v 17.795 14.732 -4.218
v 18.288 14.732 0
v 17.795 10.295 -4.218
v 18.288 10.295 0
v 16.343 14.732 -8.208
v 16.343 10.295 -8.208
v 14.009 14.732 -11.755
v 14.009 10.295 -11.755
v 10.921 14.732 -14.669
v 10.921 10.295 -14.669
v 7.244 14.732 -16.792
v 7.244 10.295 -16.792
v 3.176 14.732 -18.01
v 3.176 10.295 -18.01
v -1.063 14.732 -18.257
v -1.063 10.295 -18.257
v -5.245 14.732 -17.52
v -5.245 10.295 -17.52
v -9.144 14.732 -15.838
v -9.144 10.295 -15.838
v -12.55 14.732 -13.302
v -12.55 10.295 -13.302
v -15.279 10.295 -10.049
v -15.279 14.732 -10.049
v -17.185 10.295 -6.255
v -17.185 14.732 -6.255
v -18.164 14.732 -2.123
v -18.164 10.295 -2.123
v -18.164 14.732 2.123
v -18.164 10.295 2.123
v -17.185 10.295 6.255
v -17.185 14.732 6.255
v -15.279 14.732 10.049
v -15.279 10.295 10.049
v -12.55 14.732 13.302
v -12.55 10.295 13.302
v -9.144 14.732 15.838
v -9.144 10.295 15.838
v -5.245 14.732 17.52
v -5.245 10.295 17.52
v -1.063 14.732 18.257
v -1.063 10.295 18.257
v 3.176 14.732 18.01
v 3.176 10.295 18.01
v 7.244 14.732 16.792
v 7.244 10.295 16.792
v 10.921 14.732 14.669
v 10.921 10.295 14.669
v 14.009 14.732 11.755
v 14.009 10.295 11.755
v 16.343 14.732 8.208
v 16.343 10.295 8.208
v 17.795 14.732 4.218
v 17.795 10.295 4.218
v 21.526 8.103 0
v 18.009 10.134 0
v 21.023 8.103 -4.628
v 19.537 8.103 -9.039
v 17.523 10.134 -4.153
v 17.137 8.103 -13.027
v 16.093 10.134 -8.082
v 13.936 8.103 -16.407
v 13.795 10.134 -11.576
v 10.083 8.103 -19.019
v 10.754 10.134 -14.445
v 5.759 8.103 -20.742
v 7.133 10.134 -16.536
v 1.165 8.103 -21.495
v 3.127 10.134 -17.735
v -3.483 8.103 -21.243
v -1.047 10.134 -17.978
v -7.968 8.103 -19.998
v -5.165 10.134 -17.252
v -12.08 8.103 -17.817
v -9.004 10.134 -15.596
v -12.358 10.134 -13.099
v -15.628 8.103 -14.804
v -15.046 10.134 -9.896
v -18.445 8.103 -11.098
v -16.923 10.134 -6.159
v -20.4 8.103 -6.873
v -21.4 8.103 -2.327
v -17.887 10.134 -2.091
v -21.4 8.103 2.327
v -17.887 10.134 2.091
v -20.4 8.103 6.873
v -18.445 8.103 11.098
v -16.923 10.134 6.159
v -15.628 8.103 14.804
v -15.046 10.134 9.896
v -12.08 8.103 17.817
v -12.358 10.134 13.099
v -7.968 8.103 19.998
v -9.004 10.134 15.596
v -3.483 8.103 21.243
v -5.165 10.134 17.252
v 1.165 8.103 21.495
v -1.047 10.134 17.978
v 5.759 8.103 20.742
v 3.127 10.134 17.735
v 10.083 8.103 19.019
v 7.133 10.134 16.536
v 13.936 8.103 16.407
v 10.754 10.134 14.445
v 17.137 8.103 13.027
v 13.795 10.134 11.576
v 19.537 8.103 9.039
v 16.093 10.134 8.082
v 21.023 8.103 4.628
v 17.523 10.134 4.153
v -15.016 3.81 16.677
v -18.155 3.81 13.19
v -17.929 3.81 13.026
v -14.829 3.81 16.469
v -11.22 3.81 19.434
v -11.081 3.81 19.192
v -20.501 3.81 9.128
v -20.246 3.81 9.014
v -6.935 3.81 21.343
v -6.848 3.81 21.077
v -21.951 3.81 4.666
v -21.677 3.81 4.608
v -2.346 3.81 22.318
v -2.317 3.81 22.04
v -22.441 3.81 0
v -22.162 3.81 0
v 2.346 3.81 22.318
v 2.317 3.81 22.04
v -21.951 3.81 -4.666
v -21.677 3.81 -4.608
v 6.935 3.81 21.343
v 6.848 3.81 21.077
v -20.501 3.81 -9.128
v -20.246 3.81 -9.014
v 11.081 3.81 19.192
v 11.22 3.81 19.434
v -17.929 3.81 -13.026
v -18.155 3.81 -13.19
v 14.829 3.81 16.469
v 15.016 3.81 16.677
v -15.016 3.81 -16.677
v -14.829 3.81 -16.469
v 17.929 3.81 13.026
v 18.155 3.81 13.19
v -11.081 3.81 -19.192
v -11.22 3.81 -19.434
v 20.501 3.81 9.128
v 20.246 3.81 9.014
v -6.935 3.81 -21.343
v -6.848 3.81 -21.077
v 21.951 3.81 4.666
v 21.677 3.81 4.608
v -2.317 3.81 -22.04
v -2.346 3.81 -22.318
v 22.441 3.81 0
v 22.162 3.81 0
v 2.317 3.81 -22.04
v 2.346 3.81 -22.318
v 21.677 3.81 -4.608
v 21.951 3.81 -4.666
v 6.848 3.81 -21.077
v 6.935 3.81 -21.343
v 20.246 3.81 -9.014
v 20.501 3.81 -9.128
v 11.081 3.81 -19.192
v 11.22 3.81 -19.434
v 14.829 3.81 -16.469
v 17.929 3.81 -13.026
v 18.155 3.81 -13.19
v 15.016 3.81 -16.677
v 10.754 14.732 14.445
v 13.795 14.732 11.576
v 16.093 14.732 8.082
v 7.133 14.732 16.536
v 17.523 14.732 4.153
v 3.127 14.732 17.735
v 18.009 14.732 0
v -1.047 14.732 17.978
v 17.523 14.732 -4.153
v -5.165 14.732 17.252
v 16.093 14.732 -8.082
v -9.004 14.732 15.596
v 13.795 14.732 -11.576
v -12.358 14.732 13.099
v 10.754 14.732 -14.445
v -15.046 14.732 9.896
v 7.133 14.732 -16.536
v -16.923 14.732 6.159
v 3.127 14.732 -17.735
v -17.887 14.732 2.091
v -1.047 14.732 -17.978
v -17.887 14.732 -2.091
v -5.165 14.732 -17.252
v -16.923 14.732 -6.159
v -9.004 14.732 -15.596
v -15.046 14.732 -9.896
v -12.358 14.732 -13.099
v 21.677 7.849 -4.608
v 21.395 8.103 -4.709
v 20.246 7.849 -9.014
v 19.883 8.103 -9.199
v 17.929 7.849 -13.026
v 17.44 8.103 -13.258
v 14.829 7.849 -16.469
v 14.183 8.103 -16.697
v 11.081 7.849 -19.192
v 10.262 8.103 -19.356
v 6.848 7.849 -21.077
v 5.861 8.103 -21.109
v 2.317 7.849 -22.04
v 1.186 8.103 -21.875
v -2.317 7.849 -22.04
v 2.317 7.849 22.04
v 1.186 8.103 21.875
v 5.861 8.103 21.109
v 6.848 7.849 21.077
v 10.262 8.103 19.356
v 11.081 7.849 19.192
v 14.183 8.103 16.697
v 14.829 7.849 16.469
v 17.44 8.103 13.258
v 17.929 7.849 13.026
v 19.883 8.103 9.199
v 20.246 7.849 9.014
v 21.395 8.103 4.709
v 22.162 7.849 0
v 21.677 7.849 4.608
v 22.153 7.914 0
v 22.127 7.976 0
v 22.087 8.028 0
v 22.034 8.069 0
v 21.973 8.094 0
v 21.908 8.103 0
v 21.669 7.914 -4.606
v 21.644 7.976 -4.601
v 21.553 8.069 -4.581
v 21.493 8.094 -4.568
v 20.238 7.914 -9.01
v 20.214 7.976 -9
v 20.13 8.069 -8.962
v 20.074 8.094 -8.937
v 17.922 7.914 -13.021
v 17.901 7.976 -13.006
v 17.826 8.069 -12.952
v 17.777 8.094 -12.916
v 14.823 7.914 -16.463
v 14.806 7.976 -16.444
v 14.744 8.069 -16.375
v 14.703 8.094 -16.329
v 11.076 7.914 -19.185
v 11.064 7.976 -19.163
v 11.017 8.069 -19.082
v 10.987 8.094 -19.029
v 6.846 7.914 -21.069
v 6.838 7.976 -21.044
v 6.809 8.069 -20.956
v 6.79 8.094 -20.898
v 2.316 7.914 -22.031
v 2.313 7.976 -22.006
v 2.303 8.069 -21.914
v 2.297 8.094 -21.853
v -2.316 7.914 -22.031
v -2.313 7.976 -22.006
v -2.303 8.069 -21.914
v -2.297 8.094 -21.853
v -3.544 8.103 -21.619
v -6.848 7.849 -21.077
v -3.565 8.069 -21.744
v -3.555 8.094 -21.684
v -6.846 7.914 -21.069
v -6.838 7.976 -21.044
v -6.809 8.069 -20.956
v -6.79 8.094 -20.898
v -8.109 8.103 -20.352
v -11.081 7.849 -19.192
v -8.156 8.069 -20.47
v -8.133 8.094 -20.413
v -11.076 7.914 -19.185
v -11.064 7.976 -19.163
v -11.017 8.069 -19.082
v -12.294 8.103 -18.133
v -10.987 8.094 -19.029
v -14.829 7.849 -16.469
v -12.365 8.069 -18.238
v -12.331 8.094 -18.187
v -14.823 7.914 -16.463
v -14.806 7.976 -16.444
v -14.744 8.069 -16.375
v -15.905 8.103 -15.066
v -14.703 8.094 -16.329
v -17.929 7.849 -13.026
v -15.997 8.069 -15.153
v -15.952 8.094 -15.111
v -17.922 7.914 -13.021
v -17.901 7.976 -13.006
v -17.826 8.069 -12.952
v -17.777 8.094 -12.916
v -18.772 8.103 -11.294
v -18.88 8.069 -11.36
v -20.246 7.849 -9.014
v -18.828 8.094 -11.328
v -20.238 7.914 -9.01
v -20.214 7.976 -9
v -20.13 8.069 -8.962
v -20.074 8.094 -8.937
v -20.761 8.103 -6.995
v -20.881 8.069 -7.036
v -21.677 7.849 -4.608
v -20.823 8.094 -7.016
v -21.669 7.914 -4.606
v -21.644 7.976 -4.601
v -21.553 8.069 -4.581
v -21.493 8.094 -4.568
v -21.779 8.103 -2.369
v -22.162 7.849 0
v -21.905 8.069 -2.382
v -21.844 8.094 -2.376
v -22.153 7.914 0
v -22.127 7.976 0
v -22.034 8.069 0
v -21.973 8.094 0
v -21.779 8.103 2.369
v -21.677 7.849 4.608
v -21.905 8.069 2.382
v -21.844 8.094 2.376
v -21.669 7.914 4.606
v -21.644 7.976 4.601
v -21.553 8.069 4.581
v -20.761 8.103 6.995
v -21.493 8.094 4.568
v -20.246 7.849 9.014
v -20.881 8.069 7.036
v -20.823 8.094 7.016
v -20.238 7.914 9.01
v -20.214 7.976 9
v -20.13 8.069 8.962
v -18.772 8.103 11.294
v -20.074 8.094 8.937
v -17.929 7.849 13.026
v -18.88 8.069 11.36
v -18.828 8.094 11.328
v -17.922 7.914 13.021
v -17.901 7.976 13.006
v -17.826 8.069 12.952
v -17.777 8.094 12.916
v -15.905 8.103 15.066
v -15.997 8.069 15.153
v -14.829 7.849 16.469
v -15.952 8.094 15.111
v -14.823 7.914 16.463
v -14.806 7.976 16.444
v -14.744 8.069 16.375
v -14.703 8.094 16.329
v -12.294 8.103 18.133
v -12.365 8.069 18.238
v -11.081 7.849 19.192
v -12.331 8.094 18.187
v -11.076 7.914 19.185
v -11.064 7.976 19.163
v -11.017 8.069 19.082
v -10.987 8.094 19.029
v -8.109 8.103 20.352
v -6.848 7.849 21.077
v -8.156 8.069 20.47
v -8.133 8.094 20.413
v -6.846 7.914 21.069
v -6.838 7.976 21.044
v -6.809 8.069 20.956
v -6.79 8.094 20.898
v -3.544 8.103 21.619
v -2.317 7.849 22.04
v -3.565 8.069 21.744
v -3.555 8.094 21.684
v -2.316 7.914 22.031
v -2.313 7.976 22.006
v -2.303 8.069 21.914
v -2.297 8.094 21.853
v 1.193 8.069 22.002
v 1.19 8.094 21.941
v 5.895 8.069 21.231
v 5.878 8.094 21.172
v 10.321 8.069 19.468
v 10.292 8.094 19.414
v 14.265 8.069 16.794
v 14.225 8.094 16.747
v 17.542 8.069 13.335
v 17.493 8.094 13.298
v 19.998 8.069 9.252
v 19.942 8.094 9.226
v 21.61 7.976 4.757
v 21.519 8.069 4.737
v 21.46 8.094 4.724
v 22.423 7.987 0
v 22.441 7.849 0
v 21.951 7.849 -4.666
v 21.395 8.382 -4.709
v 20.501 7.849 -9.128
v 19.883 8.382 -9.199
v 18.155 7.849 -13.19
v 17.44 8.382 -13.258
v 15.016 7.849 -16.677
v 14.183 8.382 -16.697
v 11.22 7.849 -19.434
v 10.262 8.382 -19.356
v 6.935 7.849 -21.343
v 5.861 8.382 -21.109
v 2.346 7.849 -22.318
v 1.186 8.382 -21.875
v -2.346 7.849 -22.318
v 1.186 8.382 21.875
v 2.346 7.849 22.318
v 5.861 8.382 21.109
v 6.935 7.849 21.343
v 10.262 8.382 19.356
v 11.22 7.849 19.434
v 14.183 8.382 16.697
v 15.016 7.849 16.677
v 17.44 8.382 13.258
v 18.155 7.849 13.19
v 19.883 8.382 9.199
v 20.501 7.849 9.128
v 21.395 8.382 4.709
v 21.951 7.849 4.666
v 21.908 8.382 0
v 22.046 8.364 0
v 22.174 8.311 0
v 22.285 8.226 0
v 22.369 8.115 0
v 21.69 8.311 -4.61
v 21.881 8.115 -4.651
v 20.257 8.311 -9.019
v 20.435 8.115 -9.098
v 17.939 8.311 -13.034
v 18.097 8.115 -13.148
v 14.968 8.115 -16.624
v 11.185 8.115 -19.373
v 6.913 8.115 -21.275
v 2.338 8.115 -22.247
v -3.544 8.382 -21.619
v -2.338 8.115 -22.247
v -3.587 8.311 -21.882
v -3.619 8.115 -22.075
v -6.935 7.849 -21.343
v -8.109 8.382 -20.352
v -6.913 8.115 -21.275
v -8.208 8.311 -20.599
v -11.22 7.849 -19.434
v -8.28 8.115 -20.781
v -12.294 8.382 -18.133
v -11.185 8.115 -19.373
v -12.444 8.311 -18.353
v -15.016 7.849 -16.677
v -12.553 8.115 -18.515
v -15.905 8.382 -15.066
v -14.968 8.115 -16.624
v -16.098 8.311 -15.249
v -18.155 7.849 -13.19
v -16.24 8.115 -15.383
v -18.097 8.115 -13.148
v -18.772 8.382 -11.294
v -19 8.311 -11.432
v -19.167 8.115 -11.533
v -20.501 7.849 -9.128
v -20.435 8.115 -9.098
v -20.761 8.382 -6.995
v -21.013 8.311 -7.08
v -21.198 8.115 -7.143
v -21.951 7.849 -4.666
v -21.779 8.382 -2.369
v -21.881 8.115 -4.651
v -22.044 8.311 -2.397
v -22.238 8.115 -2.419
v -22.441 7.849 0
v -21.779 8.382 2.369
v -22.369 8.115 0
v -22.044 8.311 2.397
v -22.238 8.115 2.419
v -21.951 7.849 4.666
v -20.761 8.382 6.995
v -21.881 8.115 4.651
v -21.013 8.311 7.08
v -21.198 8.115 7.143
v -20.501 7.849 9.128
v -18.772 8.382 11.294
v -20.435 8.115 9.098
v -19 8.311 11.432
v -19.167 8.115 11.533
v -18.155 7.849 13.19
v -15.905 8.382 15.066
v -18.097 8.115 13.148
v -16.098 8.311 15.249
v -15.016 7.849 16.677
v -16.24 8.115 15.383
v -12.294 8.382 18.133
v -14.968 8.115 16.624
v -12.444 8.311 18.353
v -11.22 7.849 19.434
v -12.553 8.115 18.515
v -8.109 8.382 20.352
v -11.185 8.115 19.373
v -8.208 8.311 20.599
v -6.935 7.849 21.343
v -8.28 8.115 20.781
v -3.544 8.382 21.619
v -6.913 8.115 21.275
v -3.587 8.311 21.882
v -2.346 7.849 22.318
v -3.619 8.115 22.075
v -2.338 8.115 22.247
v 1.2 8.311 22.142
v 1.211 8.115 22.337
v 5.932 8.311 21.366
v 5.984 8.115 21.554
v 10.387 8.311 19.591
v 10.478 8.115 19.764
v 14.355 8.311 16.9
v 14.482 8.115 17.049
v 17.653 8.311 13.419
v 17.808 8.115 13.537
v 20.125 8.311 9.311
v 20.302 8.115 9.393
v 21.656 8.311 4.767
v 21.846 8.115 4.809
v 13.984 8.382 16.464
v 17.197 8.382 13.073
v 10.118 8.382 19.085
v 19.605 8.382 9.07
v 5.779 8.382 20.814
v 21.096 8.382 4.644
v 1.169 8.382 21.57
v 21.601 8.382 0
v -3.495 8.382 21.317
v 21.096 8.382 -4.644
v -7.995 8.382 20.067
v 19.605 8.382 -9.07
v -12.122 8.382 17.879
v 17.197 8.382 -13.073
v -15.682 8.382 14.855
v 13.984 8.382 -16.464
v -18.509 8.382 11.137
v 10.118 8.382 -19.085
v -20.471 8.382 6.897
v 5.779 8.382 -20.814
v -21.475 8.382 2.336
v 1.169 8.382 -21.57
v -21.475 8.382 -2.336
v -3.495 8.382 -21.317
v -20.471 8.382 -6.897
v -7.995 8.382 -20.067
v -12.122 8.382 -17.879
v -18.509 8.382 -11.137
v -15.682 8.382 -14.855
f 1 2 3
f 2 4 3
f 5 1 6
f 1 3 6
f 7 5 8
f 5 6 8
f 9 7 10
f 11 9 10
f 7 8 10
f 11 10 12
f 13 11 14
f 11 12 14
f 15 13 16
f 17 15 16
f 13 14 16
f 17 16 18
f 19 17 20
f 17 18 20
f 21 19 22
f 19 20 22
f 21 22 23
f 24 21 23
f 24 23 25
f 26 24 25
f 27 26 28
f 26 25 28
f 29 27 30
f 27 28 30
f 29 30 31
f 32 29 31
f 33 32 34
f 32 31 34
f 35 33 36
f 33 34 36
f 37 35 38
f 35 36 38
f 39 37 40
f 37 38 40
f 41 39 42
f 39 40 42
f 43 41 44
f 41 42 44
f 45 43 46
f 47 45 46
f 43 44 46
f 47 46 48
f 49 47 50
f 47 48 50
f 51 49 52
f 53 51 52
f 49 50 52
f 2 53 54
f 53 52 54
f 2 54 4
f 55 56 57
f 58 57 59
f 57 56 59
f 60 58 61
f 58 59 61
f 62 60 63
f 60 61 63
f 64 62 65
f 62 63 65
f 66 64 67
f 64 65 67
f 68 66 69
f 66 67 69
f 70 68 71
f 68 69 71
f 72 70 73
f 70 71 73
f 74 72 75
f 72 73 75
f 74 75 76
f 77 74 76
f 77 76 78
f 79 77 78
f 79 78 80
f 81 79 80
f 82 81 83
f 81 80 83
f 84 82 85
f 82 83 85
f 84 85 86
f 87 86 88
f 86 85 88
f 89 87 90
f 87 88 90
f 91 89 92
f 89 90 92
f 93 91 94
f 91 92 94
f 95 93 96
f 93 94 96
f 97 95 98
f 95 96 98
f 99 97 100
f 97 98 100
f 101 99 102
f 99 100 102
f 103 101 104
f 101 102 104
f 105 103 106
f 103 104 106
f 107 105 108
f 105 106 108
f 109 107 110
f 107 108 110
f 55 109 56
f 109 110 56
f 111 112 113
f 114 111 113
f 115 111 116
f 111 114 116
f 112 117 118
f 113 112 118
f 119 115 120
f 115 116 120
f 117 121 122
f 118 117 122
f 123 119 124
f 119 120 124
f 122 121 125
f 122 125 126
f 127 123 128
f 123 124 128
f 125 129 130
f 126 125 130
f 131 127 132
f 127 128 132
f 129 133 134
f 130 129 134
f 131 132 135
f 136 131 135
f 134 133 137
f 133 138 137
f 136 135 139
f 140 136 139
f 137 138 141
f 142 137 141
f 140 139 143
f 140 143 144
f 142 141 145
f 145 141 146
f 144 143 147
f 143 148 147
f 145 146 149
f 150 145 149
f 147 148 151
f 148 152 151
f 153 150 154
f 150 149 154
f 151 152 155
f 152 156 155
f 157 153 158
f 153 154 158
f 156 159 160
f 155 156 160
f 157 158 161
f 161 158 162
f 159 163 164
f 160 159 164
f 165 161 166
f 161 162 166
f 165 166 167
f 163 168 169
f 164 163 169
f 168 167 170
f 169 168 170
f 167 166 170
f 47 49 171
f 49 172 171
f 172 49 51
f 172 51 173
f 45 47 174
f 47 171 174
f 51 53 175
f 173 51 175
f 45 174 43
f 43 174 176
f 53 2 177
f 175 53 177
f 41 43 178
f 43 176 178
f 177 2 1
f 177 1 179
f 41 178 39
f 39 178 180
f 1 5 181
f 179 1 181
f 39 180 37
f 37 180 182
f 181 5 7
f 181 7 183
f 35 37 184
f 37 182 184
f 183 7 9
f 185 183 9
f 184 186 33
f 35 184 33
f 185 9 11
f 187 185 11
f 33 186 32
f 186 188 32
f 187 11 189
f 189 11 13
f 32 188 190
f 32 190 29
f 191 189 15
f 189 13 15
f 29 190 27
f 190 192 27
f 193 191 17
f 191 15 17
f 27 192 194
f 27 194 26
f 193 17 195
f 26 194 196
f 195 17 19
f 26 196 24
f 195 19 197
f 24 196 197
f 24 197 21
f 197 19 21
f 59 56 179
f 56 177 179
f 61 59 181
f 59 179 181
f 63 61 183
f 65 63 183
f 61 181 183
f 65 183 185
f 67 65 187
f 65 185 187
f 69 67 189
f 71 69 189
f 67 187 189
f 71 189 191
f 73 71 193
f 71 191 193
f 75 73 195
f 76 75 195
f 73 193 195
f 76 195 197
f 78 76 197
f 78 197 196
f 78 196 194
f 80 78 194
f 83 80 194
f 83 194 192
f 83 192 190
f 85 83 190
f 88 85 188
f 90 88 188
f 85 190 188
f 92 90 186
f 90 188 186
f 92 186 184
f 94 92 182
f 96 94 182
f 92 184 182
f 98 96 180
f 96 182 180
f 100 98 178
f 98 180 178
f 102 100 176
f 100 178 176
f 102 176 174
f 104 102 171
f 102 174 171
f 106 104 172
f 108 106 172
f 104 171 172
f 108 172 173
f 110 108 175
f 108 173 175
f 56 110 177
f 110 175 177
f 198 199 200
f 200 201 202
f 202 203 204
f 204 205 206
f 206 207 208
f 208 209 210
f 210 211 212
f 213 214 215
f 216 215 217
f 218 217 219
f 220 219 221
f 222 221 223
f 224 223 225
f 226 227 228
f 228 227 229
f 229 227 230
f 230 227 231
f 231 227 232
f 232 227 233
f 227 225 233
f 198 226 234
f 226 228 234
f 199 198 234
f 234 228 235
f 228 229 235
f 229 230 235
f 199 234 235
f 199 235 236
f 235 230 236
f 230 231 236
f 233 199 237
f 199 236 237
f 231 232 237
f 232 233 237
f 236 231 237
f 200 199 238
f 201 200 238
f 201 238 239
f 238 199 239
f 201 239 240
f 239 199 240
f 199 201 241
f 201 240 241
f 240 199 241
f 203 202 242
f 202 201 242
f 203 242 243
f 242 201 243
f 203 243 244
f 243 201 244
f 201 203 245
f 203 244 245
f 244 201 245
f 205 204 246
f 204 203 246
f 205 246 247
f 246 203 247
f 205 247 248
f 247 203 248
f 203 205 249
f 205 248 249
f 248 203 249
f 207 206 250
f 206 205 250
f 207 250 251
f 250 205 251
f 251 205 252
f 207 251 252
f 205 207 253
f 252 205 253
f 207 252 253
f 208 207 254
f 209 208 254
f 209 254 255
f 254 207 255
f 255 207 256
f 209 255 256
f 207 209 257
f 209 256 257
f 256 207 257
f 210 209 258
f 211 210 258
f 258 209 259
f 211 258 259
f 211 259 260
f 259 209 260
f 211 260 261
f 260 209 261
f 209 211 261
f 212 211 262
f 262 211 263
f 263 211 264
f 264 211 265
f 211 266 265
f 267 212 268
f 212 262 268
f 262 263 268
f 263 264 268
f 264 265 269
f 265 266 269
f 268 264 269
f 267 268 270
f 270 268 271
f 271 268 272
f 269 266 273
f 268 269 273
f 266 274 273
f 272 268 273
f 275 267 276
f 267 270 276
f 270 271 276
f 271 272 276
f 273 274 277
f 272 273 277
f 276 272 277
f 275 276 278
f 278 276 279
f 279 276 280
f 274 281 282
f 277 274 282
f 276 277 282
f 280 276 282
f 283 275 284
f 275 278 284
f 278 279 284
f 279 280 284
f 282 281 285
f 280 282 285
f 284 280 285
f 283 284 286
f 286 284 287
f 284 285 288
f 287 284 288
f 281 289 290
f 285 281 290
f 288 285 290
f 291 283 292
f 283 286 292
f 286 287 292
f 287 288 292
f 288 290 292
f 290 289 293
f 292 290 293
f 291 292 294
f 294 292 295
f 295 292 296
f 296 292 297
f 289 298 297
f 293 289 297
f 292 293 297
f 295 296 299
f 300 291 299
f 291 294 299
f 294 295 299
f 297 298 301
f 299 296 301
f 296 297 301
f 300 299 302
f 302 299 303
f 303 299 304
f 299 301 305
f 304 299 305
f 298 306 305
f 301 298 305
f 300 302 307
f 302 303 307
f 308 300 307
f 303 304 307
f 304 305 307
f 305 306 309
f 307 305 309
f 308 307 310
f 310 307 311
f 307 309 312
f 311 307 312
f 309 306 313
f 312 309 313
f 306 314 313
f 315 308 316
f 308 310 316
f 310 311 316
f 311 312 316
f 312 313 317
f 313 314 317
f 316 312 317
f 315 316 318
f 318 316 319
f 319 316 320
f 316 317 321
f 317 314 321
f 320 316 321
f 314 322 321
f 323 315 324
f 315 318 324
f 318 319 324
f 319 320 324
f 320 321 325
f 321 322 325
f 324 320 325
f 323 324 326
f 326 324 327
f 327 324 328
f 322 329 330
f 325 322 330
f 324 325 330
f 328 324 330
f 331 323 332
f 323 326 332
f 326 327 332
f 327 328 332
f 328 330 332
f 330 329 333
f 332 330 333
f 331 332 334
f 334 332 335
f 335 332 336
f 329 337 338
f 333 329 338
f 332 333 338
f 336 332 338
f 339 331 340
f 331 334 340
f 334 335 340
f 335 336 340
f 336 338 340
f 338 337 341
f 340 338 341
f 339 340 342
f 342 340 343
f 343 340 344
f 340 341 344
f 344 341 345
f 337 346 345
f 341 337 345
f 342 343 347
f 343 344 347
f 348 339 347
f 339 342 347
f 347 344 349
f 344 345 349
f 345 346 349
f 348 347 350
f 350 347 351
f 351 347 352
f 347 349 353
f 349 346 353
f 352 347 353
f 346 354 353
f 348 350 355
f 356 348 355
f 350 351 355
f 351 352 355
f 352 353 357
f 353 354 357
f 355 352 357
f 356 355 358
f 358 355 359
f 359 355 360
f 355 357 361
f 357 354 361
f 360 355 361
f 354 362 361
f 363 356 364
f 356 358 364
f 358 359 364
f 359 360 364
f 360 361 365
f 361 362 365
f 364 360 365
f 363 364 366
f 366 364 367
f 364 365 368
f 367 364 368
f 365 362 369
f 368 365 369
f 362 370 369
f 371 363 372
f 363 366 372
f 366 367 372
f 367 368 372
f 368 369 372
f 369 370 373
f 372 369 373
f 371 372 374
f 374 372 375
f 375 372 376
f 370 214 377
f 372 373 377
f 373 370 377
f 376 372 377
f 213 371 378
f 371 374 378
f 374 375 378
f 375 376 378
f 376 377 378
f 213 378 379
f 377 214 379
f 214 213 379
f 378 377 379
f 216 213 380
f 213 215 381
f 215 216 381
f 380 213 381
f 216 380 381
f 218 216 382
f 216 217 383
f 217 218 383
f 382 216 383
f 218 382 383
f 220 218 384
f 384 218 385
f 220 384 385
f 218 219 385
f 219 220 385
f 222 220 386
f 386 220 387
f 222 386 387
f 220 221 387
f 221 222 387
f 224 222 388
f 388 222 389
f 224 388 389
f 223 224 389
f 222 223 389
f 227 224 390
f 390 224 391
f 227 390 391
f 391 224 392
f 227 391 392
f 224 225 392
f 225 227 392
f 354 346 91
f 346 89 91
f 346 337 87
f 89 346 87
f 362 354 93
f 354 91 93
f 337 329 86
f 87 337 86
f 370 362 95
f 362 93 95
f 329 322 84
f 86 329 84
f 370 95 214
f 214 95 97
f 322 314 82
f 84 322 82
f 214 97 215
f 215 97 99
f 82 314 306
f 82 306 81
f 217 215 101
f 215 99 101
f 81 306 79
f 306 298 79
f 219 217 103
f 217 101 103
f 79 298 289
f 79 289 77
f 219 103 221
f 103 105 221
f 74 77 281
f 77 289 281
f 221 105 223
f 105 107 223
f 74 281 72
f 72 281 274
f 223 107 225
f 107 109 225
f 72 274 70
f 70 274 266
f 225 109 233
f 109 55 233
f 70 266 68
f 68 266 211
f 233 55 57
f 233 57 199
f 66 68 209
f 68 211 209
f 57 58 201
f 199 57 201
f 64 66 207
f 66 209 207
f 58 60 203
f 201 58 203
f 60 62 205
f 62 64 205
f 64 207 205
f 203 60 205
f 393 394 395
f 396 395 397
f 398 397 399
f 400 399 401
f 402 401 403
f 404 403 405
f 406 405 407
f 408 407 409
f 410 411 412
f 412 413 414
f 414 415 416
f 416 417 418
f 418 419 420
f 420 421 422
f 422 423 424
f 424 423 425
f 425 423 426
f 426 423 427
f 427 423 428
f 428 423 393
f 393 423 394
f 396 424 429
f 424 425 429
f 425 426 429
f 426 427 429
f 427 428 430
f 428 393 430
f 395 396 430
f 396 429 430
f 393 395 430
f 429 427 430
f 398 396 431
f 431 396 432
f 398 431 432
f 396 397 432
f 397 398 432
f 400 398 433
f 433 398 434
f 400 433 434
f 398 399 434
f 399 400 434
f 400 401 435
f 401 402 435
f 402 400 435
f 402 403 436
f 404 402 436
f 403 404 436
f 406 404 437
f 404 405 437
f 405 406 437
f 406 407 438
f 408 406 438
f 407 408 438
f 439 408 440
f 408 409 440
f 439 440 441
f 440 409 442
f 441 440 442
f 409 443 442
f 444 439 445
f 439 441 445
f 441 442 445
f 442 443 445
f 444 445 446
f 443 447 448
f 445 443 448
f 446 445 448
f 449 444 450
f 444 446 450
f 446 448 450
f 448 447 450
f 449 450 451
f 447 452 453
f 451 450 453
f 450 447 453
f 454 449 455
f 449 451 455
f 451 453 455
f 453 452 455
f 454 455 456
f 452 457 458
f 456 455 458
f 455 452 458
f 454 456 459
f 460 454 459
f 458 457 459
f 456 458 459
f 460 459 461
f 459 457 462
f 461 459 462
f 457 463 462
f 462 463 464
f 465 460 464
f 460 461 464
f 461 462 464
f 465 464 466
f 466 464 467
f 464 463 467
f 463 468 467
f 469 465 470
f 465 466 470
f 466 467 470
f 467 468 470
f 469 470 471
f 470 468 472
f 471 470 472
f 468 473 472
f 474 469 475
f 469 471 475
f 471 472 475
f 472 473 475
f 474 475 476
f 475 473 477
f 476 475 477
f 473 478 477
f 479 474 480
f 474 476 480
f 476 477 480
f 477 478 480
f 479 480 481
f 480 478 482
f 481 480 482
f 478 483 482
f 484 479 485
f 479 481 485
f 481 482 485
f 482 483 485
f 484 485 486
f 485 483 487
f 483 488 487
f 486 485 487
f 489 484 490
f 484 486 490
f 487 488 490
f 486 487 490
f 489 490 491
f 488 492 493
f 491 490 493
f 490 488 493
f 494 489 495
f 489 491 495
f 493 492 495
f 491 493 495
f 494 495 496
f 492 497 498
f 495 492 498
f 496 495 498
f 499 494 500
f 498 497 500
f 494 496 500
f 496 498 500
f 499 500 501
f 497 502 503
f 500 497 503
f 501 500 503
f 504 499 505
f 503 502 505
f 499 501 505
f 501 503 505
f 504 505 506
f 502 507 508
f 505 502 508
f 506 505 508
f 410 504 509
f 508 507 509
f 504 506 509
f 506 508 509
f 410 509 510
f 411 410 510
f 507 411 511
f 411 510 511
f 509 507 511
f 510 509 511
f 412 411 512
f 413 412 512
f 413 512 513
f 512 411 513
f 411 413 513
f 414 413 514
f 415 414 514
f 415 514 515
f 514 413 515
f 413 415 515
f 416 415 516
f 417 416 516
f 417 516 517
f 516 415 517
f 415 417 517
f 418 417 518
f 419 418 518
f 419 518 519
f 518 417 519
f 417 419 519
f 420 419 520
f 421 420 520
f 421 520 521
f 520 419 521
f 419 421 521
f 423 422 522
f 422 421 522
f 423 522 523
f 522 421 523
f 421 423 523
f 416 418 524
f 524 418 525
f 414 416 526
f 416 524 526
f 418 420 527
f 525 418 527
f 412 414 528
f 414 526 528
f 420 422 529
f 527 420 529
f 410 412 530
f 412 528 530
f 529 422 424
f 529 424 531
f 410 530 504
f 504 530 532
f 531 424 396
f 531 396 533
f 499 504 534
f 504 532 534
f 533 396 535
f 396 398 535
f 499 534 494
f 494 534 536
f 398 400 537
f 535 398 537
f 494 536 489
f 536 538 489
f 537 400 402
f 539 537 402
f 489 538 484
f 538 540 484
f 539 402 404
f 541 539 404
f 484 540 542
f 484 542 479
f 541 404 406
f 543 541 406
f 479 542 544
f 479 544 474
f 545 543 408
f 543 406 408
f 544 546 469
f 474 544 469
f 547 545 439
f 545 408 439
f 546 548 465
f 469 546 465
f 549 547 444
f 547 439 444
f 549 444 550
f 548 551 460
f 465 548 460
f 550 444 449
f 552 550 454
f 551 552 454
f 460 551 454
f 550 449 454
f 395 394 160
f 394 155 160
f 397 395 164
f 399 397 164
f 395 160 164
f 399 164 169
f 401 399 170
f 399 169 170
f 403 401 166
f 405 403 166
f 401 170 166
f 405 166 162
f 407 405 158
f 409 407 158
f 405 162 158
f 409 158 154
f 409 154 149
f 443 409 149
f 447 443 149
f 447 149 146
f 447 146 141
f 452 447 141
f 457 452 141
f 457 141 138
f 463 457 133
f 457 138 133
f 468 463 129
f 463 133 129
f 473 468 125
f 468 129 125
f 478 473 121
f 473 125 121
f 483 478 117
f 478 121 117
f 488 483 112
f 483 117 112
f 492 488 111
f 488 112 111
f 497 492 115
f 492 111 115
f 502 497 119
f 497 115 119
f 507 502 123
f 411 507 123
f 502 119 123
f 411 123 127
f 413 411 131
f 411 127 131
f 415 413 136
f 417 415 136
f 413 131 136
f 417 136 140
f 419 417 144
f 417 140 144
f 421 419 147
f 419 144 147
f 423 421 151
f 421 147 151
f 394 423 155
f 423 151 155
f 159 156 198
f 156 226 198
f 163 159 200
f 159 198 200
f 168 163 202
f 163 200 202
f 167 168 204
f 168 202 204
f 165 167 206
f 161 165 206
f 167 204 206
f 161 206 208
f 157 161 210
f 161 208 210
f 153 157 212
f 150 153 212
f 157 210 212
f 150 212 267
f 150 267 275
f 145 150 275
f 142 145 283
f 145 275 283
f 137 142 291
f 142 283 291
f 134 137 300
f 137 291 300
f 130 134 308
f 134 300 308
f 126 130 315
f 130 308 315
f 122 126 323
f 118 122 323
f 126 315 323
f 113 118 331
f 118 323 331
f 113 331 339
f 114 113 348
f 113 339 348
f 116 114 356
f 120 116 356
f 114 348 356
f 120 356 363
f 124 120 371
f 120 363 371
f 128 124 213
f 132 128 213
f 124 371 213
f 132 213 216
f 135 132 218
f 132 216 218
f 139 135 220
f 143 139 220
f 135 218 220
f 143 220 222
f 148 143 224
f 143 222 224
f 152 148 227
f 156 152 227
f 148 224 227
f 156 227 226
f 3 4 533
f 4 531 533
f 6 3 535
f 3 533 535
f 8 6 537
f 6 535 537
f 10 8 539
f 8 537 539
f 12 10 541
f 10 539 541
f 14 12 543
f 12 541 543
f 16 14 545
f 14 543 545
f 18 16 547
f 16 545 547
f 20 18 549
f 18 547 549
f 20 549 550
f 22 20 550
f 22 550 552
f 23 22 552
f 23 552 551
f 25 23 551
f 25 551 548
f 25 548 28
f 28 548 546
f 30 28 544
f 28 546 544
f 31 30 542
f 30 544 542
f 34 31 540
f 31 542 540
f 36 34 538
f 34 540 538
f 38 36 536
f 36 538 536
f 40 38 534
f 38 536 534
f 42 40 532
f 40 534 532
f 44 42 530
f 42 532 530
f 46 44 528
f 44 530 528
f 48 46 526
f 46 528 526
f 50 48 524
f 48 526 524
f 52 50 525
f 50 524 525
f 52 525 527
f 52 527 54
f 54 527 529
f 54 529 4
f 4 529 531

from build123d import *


with BuildPart() as part:
    # Sketch1 → Revolve1 (revolve)
    with BuildSketch(Plane(origin=(0, 0, 0), x_dir=(-1, 0, 0), z_dir=(0, 0, -1))):
        with BuildLine():
            Line((-21.5265, 8.1026), (-18.0086, 10.133660512))
            Line((-18.0086, 10.133660512), (-18.0086, 14.732))
            Line((-18.0086, 14.732), (-18.288, 14.732))
            Line((-18.288, 14.732), (-18.288, 10.294972177))
            Line((-18.288, 10.294972177), (-21.601365004, 8.382))
            Line((-21.601365004, 8.382), (-21.9075, 8.382))
            ThreePointArc((-21.9075, 8.382), (-22.284670757, 8.225770757), (-22.4409, 7.8486))
            Line((-22.4409, 7.8486), (-22.4409, 3.81))
            Line((-22.4409, 3.81), (-22.1615, 3.81))
            Line((-22.1615, 3.81), (-22.1615, 7.8486))
            ThreePointArc((-22.1615, 7.8486), (-22.087105122, 8.028205122), (-21.9075, 8.1026))
            Line((-21.9075, 8.1026), (-21.5265, 8.1026))
        make_face()
    revolve(axis=Axis((0, 3.81, 0), (0, 1, 0)))


solid = part.part
